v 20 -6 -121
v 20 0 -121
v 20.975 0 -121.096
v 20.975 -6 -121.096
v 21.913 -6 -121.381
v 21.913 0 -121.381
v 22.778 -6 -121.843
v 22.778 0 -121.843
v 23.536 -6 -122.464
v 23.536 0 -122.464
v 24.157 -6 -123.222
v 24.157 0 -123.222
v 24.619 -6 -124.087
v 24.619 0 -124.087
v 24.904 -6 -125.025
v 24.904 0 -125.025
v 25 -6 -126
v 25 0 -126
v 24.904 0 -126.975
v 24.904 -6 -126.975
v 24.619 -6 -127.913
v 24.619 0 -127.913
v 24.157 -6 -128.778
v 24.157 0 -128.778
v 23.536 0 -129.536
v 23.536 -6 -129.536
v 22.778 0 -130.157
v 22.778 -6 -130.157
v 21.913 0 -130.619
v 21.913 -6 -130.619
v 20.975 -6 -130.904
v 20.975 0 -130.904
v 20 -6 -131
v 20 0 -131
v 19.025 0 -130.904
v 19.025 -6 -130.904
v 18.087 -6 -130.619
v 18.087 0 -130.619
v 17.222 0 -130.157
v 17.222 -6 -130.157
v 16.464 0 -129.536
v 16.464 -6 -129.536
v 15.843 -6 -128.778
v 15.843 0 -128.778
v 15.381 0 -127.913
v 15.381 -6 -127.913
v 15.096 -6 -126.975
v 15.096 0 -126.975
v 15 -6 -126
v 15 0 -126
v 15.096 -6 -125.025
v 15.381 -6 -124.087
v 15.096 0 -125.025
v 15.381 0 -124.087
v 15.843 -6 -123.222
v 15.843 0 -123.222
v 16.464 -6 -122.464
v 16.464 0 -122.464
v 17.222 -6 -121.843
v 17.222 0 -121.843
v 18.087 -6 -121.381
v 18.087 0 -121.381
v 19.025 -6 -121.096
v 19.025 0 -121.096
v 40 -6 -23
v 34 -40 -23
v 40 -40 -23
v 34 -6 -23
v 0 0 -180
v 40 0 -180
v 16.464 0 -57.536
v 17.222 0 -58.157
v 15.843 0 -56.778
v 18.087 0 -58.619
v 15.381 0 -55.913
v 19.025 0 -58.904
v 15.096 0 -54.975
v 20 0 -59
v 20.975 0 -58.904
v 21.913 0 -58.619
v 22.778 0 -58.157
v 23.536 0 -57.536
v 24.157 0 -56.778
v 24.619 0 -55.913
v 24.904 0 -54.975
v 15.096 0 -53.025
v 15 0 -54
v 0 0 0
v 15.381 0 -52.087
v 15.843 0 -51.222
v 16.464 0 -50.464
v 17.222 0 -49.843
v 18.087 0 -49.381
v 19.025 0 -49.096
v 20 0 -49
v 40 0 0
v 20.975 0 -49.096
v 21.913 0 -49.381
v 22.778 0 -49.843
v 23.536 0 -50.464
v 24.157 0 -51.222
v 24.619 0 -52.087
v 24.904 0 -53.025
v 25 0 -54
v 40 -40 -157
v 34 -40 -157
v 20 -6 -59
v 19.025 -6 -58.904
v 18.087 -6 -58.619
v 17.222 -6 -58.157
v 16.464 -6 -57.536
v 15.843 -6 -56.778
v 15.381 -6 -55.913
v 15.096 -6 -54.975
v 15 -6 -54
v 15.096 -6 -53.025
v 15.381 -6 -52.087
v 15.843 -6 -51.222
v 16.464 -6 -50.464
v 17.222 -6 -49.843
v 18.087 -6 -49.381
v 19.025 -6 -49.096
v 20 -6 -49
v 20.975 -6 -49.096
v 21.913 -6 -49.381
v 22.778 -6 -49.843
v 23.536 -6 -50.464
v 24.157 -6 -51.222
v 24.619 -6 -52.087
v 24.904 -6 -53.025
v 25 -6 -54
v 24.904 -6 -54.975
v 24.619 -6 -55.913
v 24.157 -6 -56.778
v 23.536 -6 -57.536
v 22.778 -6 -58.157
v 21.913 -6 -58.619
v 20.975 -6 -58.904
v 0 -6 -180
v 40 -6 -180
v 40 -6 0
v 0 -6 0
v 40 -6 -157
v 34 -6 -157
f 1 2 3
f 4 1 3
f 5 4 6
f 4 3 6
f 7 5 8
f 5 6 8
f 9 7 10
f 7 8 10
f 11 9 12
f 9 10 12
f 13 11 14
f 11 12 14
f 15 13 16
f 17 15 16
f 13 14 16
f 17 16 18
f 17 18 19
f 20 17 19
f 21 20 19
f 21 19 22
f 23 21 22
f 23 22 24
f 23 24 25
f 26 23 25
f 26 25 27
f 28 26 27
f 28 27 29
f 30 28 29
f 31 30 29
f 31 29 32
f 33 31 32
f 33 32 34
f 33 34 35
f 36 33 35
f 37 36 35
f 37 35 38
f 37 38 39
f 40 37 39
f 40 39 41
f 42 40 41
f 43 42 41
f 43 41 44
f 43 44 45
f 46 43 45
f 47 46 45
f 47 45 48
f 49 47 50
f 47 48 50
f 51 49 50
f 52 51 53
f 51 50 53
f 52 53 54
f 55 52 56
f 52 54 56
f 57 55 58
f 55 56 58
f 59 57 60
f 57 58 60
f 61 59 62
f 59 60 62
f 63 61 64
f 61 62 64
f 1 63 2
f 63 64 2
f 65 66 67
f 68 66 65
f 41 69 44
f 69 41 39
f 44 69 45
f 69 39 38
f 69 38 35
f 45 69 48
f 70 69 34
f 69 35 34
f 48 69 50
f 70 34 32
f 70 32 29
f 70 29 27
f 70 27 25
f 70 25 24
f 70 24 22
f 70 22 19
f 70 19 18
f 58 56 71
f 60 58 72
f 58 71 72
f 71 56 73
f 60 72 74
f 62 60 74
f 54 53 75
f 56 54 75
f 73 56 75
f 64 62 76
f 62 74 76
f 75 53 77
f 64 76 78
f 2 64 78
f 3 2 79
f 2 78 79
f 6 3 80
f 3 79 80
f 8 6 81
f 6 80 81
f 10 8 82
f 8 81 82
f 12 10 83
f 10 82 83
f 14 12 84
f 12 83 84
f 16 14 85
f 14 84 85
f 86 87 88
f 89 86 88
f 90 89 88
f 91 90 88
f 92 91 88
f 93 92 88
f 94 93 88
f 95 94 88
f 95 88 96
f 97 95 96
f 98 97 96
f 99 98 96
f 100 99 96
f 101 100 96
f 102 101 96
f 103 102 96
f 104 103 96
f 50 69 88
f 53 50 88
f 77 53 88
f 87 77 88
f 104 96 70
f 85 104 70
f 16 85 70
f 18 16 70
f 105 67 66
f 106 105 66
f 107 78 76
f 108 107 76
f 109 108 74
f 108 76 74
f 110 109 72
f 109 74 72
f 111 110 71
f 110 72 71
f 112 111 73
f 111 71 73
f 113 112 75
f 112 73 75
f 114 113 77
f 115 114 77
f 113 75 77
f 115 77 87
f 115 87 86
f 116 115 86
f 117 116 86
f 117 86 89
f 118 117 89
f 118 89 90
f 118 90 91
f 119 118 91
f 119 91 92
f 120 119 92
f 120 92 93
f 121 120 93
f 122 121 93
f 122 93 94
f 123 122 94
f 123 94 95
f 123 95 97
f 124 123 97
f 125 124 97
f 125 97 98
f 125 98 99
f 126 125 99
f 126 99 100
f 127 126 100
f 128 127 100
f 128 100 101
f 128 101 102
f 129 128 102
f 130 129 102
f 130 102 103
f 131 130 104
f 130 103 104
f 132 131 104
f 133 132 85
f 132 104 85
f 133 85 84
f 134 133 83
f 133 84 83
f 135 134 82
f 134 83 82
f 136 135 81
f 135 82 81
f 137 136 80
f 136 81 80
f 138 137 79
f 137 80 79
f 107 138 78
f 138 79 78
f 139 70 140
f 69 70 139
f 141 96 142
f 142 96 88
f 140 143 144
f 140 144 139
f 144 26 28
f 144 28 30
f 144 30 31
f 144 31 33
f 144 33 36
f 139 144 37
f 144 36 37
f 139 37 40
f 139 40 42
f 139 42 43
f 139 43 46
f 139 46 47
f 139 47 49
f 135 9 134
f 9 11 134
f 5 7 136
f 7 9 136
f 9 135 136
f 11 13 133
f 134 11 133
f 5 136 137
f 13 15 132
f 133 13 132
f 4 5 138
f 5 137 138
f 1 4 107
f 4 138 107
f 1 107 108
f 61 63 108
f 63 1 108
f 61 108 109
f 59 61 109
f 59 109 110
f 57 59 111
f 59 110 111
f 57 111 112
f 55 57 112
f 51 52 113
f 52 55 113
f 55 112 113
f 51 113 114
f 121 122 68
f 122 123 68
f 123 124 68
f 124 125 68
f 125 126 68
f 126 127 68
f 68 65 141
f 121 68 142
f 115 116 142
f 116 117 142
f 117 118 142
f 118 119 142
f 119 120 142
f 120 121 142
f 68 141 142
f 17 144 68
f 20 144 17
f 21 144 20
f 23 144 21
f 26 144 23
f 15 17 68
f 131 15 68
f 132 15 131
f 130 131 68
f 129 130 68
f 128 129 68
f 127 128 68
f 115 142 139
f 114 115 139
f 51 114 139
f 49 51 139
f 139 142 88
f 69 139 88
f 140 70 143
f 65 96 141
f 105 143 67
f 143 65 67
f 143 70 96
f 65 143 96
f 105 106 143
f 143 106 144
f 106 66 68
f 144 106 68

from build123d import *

# Parameters (mm, degrees)
BOSS_EXTRUDE1_DEPTH = 180
SKETCH2_W           = 23
SKETCH2_H           = 34
CUT_EXTRUDE1_DEPTH  = 200
SKETCH3_R           = 5
CUT_EXTRUDE2_DEPTH  = 200


with BuildPart() as part:
    # Sketch1 → Boss-Extrude1 (new body)
    with BuildSketch(Plane.XY):
        Polygon((0, 0), (40, 0), (40, -40), (34, -40), (34, -6), (0, -6), align=None)
    extrude(amount=-BOSS_EXTRUDE1_DEPTH)

    # Sketch2 → Cut-Extrude1 (cut)
    with BuildSketch(Plane.ZY.offset(-34)):
        with Locations((-11.5, -23)):
            Rectangle(SKETCH2_W, SKETCH2_H)
        with Locations((-168.5, -23)):
            Rectangle(SKETCH2_W, SKETCH2_H)
    extrude(amount=-CUT_EXTRUDE1_DEPTH, mode=Mode.SUBTRACT)

    # Sketch3 → Cut-Extrude2 (cut)
    with BuildSketch(Plane(origin=(0, 0, 0), x_dir=(1, 0, 0), z_dir=(0, 1, 0))):
        with Locations(Location((20, 126, 0), (0, 0, 270))):
            Circle(SKETCH3_R)
        with Locations(Location((20, 54, 0), (0, 0, 90))):
            Circle(SKETCH3_R)
    extrude(amount=-CUT_EXTRUDE2_DEPTH, mode=Mode.SUBTRACT)


solid = part.part
